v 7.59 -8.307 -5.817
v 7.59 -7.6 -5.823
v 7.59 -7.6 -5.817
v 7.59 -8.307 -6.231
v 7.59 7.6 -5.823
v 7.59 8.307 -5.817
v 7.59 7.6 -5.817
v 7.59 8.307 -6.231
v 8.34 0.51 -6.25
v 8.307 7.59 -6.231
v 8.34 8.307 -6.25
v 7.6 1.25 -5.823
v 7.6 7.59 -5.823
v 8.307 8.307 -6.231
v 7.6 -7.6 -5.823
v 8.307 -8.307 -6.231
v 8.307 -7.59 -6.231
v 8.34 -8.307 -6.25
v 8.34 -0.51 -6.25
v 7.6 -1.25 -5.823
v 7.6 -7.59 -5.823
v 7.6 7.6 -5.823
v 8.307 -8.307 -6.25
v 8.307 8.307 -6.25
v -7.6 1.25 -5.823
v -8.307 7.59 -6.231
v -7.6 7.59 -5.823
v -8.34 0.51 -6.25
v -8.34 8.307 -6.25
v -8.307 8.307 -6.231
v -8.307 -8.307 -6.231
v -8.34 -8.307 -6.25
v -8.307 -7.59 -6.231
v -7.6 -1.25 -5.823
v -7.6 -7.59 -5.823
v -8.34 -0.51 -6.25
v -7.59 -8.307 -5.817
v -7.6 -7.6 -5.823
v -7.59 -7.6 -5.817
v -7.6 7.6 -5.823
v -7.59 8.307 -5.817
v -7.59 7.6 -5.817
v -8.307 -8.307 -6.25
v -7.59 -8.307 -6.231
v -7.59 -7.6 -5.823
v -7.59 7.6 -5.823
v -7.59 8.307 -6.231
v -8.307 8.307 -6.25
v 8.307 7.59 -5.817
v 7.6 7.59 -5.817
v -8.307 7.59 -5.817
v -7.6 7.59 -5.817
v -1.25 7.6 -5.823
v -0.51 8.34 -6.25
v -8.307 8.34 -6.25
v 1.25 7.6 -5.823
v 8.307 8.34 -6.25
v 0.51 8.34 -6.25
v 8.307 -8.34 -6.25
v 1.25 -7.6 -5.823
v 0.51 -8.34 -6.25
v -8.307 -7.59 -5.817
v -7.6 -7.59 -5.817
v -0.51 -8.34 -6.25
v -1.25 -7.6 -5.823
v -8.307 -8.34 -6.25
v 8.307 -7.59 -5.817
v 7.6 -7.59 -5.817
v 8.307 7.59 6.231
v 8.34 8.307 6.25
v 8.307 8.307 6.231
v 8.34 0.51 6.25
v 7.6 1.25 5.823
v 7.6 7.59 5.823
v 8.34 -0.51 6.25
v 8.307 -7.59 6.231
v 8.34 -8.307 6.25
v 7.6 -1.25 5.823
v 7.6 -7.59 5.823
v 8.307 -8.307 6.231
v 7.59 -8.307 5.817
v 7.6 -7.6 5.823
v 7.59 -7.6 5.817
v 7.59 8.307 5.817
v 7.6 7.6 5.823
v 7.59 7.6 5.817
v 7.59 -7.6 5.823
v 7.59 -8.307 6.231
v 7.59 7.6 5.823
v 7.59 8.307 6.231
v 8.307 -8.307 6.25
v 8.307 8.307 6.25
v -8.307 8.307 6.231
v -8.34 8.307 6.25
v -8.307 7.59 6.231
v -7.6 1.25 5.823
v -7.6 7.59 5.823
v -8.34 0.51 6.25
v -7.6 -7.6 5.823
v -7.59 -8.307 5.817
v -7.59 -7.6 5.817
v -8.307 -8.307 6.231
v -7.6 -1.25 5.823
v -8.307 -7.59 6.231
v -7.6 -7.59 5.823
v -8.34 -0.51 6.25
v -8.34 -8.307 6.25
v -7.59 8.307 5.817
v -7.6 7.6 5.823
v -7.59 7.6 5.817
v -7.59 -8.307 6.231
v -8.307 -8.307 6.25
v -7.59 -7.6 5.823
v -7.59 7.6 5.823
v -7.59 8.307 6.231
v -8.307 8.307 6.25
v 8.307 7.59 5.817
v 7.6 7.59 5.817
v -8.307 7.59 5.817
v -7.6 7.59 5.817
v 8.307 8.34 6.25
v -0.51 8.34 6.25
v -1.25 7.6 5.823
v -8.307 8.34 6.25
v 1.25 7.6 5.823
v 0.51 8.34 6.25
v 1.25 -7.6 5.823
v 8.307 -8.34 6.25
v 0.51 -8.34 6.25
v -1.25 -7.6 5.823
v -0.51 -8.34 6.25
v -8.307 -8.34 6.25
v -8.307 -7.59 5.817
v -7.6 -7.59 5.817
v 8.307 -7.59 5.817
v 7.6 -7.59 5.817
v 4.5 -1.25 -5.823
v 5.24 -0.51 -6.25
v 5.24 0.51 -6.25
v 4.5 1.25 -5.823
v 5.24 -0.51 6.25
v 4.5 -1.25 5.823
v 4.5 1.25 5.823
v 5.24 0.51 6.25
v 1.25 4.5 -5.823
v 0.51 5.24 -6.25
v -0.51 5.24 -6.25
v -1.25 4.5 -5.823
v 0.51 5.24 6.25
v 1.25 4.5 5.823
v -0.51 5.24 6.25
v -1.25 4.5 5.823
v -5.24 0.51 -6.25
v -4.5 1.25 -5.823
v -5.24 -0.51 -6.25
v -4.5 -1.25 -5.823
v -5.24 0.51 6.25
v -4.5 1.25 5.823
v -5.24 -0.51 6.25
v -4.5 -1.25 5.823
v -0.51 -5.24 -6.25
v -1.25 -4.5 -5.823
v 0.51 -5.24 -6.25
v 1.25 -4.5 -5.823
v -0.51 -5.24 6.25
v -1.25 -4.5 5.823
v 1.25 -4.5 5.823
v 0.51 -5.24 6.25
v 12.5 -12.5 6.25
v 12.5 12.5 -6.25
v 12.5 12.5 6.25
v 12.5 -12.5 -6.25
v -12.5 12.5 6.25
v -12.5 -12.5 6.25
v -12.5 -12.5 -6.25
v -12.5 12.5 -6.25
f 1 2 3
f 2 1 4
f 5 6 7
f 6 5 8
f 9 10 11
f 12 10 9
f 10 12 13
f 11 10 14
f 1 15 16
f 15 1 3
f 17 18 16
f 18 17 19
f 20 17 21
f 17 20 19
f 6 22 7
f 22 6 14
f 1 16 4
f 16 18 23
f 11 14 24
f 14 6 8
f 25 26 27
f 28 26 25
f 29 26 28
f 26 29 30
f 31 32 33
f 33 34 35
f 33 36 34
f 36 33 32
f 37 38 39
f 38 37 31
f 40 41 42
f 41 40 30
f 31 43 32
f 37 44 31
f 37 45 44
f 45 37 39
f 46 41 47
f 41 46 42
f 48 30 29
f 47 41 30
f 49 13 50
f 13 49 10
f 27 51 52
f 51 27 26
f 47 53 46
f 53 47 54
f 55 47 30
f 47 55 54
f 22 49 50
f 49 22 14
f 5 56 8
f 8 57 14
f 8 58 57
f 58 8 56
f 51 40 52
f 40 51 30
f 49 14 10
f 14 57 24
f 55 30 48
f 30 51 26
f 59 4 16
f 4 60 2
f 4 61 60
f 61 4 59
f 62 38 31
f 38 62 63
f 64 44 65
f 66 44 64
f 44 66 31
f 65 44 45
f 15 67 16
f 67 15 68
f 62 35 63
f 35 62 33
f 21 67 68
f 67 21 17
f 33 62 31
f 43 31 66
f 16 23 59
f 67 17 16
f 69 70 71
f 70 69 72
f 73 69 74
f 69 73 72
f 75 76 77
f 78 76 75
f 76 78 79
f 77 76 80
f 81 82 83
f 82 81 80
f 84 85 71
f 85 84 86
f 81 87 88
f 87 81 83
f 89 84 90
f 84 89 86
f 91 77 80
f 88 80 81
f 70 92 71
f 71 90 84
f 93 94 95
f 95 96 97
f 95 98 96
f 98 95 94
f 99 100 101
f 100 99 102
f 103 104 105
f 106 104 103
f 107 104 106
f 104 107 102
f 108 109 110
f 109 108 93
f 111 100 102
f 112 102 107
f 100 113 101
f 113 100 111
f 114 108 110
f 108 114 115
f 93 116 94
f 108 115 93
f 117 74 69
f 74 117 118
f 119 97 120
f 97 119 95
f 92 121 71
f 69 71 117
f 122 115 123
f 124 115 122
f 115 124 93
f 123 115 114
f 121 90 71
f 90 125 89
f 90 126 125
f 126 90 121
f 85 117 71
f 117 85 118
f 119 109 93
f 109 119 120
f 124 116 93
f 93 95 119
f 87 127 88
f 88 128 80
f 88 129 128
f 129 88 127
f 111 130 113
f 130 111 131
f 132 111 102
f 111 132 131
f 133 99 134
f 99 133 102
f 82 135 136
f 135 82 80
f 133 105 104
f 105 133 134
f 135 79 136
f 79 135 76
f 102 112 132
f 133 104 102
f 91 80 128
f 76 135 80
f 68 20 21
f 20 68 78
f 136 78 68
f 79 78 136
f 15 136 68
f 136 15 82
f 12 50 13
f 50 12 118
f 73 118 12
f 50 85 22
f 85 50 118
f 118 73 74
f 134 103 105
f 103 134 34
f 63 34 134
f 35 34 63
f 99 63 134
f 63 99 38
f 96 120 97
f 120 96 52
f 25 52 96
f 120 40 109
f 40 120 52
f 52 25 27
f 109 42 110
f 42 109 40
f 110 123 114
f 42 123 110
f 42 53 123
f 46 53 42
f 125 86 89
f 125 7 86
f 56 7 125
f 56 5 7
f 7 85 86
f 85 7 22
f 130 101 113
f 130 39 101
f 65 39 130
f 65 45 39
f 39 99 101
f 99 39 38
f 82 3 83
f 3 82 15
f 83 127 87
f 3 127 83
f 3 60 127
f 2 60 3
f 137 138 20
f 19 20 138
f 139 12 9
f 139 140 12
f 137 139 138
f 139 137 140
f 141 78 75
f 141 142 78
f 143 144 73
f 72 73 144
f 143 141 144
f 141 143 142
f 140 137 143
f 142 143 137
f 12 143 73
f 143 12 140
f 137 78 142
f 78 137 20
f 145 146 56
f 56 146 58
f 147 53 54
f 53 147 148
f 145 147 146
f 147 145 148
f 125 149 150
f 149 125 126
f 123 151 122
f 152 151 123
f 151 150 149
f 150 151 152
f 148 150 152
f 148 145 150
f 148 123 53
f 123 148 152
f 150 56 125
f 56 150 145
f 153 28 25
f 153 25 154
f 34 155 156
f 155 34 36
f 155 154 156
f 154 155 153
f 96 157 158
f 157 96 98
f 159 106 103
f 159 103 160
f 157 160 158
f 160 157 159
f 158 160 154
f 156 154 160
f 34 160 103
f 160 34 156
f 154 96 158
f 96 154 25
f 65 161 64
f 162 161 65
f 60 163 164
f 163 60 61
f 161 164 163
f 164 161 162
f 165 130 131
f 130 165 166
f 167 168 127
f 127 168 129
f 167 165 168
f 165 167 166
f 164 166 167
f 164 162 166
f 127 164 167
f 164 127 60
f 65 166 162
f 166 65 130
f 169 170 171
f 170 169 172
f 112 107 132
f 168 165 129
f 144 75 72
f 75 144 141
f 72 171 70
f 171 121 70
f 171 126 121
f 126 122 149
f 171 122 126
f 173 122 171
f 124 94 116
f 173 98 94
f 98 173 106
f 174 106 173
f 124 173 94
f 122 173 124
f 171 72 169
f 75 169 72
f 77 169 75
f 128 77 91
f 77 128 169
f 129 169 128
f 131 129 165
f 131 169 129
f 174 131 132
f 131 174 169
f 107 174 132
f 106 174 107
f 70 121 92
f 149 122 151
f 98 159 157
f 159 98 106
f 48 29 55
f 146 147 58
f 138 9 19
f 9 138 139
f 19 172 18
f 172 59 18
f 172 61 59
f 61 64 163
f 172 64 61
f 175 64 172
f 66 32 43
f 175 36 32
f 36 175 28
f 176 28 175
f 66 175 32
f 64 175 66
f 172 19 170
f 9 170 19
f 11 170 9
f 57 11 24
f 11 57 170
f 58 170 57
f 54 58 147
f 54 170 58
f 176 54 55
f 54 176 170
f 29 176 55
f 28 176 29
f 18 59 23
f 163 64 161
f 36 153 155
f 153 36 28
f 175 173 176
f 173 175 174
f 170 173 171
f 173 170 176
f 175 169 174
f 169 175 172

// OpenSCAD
// file: vertex.scad
/*
Edited by Tony@think3dprint3d.com to add chamfers and a few other minor modifications to reduce the
amount of printed part preparation required
*/

include <../configuration.scad>;
use <teardrop.scad>;

$fn = 24;
roundness = 6;


module extrusion_cutout(h, extra,exact_h) {
  difference() {
	union() {
    	cube([extrusion+extra, extrusion+extra, h], center=true);
		//prefettle - added by TL
		for(i=[-1,1]){
			translate ([((extrusion+extra+chamfer_width/2)/2-0.01),0, i*((exact_h)/2)])
				rotate([90,0,0])
					cylinder(r=chamfer_width/2,h=extrusion+extra+chamfer_width*sqrt(2), $fn=3, center=true);
			translate ([-1*((extrusion+extra+chamfer_width/2)/2-0.01),0, i*((exact_h)/2)])
				rotate([90,180,0])
					cylinder(r=chamfer_width/2,h=extrusion+extra+chamfer_width*sqrt(2), $fn=3, center=true);
			translate ([0,((extrusion+extra+chamfer_width/2)/2-0.01), i*((exact_h)/2)])
				rotate([90,0,90])
					cylinder(r=chamfer_width/2,h=extrusion+extra+chamfer_width*sqrt(2), $fn=3, center=true);
			translate ([0,-1*((extrusion+extra+chamfer_width/2)/2-0.01), i*((exact_h)/2)])
				rotate([90,0,270])
					cylinder(r=chamfer_width/2,h=extrusion+extra+chamfer_width*sqrt(2), $fn=3, center=true);
		}//prefettle
	 }
    for (a = [0:90:359]) rotate([0, 0, a])
		difference(){
      translate([extrusion/2, 0, 0])
        cube([6, 2.5, h+1], center=true);
		//prefettle
		for(i=[-1,1]){
			translate ([(extrusion)/2-1.5+chamfer_width*sqrt(2)/2,-1*((2.5-chamfer_width/2)/2+0.01), i*((exact_h)/2)])
				rotate([90,0,90])
					cylinder(r=chamfer_width/2,h=3+chamfer_width*sqrt(2)+0.01, $fn=3, center=true);
			translate([(extrusion)/2-1.5+chamfer_width*sqrt(2)/2,((2.5-chamfer_width/2)/2+0.01), i*((exact_h)/2)])
				rotate([90,0,270])
					cylinder(r=chamfer_width/2,h=3+chamfer_width*sqrt(2)+0.01, $fn=3, center=true);
      		translate([(extrusion)/2-3+chamfer_width/4-0.01, 0, 0])
				translate ([0,0, i*((exact_h)/2)])
					rotate([90,0,0])
						cylinder(r=chamfer_width/2,h=2.5+0.01, $fn=3, center=true);
		}//prefettle
    }
  }
}

//changed to truncated teardrops to improve printing by TL
module screw_socket() {
  teardrop(h=20,r=m3_wide_radius,center=true,truncate=true);
  translate([0, 0, 3.6]) teardrop(h=5,r=3.5,truncate=true);

}

module screw_socket_cone() {
  union() {
    screw_socket();
    scale([1, 1, -1]) cylinder(r1=4, r2=7, h=4);
  }
}

module vertex(height, idler_offset, idler_space) {
  union() {
    // Pads to improve print bed adhesion for slim ends.
    translate([-37.5, 52.2, -height/2]) cylinder(r=8, h=0.5); 
    translate([37.5, 52.2, -height/2]) cylinder(r=8, h=0.5);
    difference() {
      union() {
        intersection() {
          translate([0, 22, 0])
            cylinder(r=36, h=height, center=true, $fn=60);
          translate([0, -37, 0]) rotate([0, 0, 30])
            cylinder(r=50, h=height+1, center=true, $fn=6);
        }
        translate([0, 38, 0]) intersection() {
          rotate([0, 0, -90])
            cylinder(r=55, h=height, center=true, $fn=3);
          translate([0, 10, 0])
            cube([100, 100, 2*height], center=true);
          translate([0, -10, 0]) rotate([0, 0, 30])
            cylinder(r=55, h=height+1, center=true, $fn=6);
        }
      }
      difference() {
        translate([0, 58, 0]) minkowski() {
          intersection() {
            rotate([0, 0, -90])
              cylinder(r=55, h=height, center=true, $fn=3);
            translate([0, -32, 0])
              cube([100, 16, 2*height], center=true);
          }
          cylinder(r=roundness, h=1, center=true);
        }
        // Idler support cones.
        translate([0, 26+idler_offset-30, 0]) rotate([-90, 0, 0])
          cylinder(r1=30, r2=2, h=30-idler_space/2);
        translate([0, 26+idler_offset+30, 0]) rotate([90, 0, 0])
          cylinder(r1=30, r2=2, h=30-idler_space/2);
      }
      translate([0, 58, 0]) minkowski() {
        intersection() {
          rotate([0, 0, -90])
            cylinder(r=55, h=height, center=true, $fn=3);
          translate([0, 7, 0])
            cube([100, 30, 2*height], center=true);
        }
        cylinder(r=roundness, h=1, center=true);
      }
      extrusion_cutout(height+10, 2*extra_radius, height);
      for (z = [0:30:height]) {
        translate([0, -7.5-extra_radius, z+7.5-height/2]) rotate([90, 0, 0])
          screw_socket_cone();
        for (a = [-1, 1]) {
          rotate([0, 0, 30*a]) translate([-16*a, 111, z+7.5-height/2]) {
            // % rotate([90, 0, 0]) extrusion_cutout(200, 0);
            // Screw sockets.
            for (y = [-88, -44]) {
              translate([a*7.5, y, 0]) rotate([0, a*90, 0]) rotate([0, 0, a*90])screw_socket();
            }
            // Nut tunnels.
	    for (z = [-1, 1]) {
	      scale([1, 1, z]) translate([0, -100, 3]) minkowski() {
	        rotate([0, 0, -a*30]) cylinder(r=4.1, h=16, $fn=6); //changed to 4.1 by TL
		cube([0.1, 5, 0.1], center=true);
	      }
            }
          }
        }
      }
    }
  }
}

translate([0, 0, 7.5]) vertex(15, idler_offset=0, idler_space=10);
// file: teardrop.scad
///////////////////////////////////////////////////////////////////////////////////////////
// The teardrop functions below are from "teardrop.scad" by nophead's Mendel90 design
//
// Mendel90
//
// GNU GPL v2
// nop.head@gmail.com
// hydraraptor.blogspot.com
//
// For making horizontal holes that don't need support material
// Small holes can get away without it but they print better with truncated teardrops
//
module teardrop_2D(r, truncate = true) {
    difference() {
        union() {
            circle(r = r, center = true);
            translate([0,r / sqrt(2),0])
                rotate([0,0,45])
                    square([r, r], center = true);
        }
        if(truncate)
            translate([0, r * 2, 0])
                square([2 * r, 2 * r], center = true);
    }
}

module teardrop(h, r, center, truncate = true)
    linear_extrude(height = h, convexity = 2, center = center)
        teardrop_2D(r, truncate);

module teardrop_plus(h, r, center, truncate = true)
    teardrop(h, r + layer_height / 4, center, truncate);


module tearslot(h, r, w, center)
    linear_extrude(height = h, convexity = 6, center = center)
        hull() {
            translate([-w/2,0,0]) teardrop_2D(r, true);
            translate([ w/2,0,0]) teardrop_2D(r, true);
        }

module vertical_tearslot(h, r, l, center = true)
    linear_extrude(height = h, convexity = 6, center = center)
        hull() {
            translate([0, l / 2]) teardrop_2D(r, true);
            translate([0, -l / 2, 0])
                circle(r = r, center = true);
        }

//////////////////////////////////////////////////////////////////////////////////////
// file: ../configuration.scad
// Increase this if your slicer or printer make holes too tight.
extra_radius = 0.1;

// OD = outside diameter, corner to corner.
m3_nut_od = 6.1;
m3_nut_radius = m3_nut_od/2 + 0.2 + extra_radius;
m3_washer_radius = 3.5 + extra_radius;

// Major diameter of metric 3mm thread.
m3_major = 2.85;
m3_radius = m3_major/2 + extra_radius;
m3_wide_radius = m3_major/2 + extra_radius + 0.2;

// NEMA17 stepper motors.
motor_shaft_diameter = 5;
motor_shaft_radius = motor_shaft_diameter/2 + extra_radius;

// Frame brackets. M3x8mm screws work best with 3.6 mm brackets.
thickness = 3.6;

// OpenBeam or Misumi. Currently only 15x15 mm, but there is a plan
// to make models more parametric and allow 20x20 mm in the future.
extrusion = 15;

// Placement for the NEMA17 stepper motors.
motor_offset = 44;
motor_length = 47;

chamfer_width = 1;
// main file
include <../configuration.scad>;
use <../T3P3_additions/teardrop.scad>;
use <../T3P3_additions/vertex.scad>;

difference() {
	translate([0,0,0]) cube([25,25,12.5], center=true);
	extrusion_cutout(extrusion+10, 2*extra_radius, 12.5);
}
